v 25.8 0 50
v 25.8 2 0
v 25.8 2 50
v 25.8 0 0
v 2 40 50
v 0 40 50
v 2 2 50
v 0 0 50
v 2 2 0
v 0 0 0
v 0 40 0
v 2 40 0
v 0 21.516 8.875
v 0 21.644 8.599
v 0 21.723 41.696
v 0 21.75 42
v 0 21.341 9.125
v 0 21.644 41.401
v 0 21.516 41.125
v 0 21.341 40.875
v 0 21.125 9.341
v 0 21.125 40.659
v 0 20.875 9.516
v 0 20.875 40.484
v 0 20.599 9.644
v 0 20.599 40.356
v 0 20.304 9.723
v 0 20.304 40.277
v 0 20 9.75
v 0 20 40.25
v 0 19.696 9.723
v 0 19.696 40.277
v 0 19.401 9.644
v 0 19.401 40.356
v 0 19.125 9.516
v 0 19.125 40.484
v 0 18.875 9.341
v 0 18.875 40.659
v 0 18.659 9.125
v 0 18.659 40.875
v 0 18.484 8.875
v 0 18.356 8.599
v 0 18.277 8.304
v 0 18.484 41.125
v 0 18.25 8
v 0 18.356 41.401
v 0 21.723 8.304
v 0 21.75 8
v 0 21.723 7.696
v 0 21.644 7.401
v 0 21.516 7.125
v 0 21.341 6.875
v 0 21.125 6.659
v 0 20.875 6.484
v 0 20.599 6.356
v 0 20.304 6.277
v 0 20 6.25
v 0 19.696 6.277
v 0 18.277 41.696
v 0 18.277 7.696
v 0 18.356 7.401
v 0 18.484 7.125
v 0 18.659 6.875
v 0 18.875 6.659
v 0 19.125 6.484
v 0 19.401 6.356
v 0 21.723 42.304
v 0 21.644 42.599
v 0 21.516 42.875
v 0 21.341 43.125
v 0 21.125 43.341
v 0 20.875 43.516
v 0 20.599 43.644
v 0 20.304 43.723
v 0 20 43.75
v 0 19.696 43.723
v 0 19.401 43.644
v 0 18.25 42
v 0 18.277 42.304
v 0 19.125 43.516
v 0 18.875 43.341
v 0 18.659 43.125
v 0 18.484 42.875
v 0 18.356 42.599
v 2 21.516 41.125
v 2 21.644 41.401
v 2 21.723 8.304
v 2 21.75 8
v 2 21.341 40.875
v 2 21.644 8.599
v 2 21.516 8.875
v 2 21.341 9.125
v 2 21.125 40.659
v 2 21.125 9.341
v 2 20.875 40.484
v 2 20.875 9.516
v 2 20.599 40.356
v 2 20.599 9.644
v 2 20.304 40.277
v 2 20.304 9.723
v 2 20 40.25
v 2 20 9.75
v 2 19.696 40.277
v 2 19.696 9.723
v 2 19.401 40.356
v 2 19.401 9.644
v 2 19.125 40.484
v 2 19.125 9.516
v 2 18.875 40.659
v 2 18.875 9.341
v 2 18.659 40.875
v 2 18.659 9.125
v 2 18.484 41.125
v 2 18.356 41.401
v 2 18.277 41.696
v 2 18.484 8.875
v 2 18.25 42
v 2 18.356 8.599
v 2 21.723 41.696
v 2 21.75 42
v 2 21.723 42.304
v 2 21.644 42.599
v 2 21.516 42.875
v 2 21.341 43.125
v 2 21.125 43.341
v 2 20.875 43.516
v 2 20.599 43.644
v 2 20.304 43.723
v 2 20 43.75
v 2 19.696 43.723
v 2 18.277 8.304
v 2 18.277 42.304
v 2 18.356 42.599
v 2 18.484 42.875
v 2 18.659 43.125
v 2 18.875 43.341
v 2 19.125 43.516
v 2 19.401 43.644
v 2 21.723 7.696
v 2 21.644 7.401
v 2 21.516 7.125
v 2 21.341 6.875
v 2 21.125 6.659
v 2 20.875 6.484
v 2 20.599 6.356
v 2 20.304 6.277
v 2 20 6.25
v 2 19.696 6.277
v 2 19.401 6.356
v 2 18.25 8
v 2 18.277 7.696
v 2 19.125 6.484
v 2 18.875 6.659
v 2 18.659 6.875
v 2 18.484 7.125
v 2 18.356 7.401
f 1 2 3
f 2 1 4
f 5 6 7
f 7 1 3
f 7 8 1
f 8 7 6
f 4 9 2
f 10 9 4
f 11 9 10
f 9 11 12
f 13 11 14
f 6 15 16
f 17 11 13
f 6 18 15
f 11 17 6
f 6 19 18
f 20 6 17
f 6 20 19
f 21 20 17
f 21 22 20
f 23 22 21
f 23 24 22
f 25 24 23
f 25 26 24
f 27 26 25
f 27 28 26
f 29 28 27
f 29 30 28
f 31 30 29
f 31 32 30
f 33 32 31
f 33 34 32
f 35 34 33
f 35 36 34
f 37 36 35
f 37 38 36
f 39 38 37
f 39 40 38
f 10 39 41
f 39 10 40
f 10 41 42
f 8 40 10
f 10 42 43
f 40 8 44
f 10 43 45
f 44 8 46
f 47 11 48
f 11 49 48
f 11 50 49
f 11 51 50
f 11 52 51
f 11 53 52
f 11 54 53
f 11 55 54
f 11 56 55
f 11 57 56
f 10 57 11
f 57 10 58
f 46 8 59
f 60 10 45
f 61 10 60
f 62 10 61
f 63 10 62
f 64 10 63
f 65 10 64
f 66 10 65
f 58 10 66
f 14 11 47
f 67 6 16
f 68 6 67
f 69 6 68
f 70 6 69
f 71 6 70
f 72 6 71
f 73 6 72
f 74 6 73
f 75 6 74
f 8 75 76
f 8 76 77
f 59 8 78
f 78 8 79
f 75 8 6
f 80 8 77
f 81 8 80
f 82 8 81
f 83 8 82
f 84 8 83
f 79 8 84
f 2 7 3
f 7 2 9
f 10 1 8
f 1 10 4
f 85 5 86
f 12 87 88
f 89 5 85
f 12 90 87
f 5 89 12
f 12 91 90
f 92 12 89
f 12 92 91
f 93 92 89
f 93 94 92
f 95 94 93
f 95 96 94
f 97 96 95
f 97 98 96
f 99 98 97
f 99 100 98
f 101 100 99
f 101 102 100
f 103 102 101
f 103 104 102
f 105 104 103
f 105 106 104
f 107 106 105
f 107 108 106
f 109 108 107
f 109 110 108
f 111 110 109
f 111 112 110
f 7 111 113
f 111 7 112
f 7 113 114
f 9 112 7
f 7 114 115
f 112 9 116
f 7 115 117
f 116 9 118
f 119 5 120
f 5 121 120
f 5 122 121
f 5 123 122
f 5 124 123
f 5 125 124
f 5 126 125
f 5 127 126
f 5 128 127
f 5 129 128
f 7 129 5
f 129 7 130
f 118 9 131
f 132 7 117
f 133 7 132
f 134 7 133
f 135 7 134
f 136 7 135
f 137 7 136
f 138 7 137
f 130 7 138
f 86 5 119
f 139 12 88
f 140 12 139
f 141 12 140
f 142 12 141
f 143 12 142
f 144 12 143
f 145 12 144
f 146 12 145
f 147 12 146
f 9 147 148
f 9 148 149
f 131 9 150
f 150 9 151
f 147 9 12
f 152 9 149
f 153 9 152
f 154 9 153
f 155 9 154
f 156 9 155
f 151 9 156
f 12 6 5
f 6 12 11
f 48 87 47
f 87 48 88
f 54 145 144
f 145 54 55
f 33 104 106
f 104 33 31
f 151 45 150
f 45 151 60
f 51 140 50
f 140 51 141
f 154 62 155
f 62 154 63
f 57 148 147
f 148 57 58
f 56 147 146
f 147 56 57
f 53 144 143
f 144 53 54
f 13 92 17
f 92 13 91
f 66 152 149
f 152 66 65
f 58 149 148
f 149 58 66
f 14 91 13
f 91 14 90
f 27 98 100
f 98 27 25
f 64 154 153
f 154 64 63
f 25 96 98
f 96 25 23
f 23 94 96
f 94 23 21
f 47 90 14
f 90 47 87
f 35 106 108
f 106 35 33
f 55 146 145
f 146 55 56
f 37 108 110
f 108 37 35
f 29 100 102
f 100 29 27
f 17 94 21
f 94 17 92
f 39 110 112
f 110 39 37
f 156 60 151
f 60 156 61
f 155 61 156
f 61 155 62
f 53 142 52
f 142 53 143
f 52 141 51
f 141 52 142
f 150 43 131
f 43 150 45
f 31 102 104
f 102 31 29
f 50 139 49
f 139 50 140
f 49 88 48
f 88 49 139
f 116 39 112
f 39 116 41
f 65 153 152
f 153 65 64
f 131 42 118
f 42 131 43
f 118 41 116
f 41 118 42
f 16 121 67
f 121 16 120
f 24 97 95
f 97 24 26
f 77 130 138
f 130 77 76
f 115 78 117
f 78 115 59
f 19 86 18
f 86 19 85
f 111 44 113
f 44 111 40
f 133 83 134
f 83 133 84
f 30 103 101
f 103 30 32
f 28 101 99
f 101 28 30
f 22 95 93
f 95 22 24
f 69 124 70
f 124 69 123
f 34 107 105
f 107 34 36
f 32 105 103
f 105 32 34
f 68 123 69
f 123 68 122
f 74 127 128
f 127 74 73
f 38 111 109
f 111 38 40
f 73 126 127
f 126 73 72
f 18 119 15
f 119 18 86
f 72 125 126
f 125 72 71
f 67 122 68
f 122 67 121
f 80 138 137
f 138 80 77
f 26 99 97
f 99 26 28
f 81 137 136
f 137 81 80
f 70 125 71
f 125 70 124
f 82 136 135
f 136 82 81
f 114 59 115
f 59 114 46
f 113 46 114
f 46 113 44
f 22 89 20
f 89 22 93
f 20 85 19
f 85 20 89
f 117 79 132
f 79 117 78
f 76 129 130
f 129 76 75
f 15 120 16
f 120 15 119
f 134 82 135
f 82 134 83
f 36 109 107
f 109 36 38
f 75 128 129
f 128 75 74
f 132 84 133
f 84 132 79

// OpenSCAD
// ============================================================================
// Side clamp guide
//
// This component is defined entirely in local coordinates.
//
// Local axes:
// X = width across the L profile
// Y = length toward the side clamp
// Z = vertical
//
// The component can be opened and rendered directly. It does not depend on
// assembly coordinates or derived legacy variables.
// ============================================================================

module side_clamp_guide(
    side="left",
    height=50,
    glass_leg_width=25.8,
    guide_length=40,
    wall_thickness=2,
    screw_diameter=3.5,
    screw_z=[8,42],
    show_screw_holes=true
) {
    assert(side=="left" || side=="right",
        "side must be \"left\" or \"right\".");
    assert(height > 0,
        "height must be positive.");
    assert(glass_leg_width > wall_thickness,
        "glass_leg_width must exceed wall_thickness.");
    assert(guide_length >= 40,
        "guide_length must cover the 30 mm clamp section plus 10 mm overhang.");
    assert(wall_thickness > 0,
        "wall_thickness must be positive.");

    right_side = side=="right";

    // Build one left-hand local profile, then mirror it for the right side.
    mirror([right_side ? 1 : 0,0,0])
    difference() {
        union() {
            // Full leg against the oak/glass trim.
            cube([
                glass_leg_width,
                wall_thickness,
                height
            ]);

            // Straight guide leg toward the metal side clamp.
            cube([
                wall_thickness,
                guide_length,
                height
            ]);
        }

        if(show_screw_holes)
            for(z_position=screw_z)
                translate([
                    -0.2,
                    guide_length/2,
                    z_position
                ])
                    rotate([0,90,0])
                        cylinder(
                            d=screw_diameter,
                            h=wall_thickness+0.4,
                            $fn=36
                        );
    }
}

module side_clamp_guide_view(
    side="left",
    orientation="model"
) {
    assert(
        orientation=="model" || orientation=="print",
        "orientation must be \"model\" or \"print\"."
    );

    if(orientation=="model")
        side_clamp_guide(side=side);
    else
        rotate([90,0,0])
            side_clamp_guide(side=side);
}

/* [Component view] */

side = "left"; // [left,right]
orientation = "model"; // [model,print]

/* [Component dimensions] */

guide_length = 40;
glass_leg_width = 25.8;
height = 50;
wall_thickness = 2;

side_clamp_guide(
    side=side,
    height=height,
    glass_leg_width=glass_leg_width,
    guide_length=guide_length,
    wall_thickness=wall_thickness
);
